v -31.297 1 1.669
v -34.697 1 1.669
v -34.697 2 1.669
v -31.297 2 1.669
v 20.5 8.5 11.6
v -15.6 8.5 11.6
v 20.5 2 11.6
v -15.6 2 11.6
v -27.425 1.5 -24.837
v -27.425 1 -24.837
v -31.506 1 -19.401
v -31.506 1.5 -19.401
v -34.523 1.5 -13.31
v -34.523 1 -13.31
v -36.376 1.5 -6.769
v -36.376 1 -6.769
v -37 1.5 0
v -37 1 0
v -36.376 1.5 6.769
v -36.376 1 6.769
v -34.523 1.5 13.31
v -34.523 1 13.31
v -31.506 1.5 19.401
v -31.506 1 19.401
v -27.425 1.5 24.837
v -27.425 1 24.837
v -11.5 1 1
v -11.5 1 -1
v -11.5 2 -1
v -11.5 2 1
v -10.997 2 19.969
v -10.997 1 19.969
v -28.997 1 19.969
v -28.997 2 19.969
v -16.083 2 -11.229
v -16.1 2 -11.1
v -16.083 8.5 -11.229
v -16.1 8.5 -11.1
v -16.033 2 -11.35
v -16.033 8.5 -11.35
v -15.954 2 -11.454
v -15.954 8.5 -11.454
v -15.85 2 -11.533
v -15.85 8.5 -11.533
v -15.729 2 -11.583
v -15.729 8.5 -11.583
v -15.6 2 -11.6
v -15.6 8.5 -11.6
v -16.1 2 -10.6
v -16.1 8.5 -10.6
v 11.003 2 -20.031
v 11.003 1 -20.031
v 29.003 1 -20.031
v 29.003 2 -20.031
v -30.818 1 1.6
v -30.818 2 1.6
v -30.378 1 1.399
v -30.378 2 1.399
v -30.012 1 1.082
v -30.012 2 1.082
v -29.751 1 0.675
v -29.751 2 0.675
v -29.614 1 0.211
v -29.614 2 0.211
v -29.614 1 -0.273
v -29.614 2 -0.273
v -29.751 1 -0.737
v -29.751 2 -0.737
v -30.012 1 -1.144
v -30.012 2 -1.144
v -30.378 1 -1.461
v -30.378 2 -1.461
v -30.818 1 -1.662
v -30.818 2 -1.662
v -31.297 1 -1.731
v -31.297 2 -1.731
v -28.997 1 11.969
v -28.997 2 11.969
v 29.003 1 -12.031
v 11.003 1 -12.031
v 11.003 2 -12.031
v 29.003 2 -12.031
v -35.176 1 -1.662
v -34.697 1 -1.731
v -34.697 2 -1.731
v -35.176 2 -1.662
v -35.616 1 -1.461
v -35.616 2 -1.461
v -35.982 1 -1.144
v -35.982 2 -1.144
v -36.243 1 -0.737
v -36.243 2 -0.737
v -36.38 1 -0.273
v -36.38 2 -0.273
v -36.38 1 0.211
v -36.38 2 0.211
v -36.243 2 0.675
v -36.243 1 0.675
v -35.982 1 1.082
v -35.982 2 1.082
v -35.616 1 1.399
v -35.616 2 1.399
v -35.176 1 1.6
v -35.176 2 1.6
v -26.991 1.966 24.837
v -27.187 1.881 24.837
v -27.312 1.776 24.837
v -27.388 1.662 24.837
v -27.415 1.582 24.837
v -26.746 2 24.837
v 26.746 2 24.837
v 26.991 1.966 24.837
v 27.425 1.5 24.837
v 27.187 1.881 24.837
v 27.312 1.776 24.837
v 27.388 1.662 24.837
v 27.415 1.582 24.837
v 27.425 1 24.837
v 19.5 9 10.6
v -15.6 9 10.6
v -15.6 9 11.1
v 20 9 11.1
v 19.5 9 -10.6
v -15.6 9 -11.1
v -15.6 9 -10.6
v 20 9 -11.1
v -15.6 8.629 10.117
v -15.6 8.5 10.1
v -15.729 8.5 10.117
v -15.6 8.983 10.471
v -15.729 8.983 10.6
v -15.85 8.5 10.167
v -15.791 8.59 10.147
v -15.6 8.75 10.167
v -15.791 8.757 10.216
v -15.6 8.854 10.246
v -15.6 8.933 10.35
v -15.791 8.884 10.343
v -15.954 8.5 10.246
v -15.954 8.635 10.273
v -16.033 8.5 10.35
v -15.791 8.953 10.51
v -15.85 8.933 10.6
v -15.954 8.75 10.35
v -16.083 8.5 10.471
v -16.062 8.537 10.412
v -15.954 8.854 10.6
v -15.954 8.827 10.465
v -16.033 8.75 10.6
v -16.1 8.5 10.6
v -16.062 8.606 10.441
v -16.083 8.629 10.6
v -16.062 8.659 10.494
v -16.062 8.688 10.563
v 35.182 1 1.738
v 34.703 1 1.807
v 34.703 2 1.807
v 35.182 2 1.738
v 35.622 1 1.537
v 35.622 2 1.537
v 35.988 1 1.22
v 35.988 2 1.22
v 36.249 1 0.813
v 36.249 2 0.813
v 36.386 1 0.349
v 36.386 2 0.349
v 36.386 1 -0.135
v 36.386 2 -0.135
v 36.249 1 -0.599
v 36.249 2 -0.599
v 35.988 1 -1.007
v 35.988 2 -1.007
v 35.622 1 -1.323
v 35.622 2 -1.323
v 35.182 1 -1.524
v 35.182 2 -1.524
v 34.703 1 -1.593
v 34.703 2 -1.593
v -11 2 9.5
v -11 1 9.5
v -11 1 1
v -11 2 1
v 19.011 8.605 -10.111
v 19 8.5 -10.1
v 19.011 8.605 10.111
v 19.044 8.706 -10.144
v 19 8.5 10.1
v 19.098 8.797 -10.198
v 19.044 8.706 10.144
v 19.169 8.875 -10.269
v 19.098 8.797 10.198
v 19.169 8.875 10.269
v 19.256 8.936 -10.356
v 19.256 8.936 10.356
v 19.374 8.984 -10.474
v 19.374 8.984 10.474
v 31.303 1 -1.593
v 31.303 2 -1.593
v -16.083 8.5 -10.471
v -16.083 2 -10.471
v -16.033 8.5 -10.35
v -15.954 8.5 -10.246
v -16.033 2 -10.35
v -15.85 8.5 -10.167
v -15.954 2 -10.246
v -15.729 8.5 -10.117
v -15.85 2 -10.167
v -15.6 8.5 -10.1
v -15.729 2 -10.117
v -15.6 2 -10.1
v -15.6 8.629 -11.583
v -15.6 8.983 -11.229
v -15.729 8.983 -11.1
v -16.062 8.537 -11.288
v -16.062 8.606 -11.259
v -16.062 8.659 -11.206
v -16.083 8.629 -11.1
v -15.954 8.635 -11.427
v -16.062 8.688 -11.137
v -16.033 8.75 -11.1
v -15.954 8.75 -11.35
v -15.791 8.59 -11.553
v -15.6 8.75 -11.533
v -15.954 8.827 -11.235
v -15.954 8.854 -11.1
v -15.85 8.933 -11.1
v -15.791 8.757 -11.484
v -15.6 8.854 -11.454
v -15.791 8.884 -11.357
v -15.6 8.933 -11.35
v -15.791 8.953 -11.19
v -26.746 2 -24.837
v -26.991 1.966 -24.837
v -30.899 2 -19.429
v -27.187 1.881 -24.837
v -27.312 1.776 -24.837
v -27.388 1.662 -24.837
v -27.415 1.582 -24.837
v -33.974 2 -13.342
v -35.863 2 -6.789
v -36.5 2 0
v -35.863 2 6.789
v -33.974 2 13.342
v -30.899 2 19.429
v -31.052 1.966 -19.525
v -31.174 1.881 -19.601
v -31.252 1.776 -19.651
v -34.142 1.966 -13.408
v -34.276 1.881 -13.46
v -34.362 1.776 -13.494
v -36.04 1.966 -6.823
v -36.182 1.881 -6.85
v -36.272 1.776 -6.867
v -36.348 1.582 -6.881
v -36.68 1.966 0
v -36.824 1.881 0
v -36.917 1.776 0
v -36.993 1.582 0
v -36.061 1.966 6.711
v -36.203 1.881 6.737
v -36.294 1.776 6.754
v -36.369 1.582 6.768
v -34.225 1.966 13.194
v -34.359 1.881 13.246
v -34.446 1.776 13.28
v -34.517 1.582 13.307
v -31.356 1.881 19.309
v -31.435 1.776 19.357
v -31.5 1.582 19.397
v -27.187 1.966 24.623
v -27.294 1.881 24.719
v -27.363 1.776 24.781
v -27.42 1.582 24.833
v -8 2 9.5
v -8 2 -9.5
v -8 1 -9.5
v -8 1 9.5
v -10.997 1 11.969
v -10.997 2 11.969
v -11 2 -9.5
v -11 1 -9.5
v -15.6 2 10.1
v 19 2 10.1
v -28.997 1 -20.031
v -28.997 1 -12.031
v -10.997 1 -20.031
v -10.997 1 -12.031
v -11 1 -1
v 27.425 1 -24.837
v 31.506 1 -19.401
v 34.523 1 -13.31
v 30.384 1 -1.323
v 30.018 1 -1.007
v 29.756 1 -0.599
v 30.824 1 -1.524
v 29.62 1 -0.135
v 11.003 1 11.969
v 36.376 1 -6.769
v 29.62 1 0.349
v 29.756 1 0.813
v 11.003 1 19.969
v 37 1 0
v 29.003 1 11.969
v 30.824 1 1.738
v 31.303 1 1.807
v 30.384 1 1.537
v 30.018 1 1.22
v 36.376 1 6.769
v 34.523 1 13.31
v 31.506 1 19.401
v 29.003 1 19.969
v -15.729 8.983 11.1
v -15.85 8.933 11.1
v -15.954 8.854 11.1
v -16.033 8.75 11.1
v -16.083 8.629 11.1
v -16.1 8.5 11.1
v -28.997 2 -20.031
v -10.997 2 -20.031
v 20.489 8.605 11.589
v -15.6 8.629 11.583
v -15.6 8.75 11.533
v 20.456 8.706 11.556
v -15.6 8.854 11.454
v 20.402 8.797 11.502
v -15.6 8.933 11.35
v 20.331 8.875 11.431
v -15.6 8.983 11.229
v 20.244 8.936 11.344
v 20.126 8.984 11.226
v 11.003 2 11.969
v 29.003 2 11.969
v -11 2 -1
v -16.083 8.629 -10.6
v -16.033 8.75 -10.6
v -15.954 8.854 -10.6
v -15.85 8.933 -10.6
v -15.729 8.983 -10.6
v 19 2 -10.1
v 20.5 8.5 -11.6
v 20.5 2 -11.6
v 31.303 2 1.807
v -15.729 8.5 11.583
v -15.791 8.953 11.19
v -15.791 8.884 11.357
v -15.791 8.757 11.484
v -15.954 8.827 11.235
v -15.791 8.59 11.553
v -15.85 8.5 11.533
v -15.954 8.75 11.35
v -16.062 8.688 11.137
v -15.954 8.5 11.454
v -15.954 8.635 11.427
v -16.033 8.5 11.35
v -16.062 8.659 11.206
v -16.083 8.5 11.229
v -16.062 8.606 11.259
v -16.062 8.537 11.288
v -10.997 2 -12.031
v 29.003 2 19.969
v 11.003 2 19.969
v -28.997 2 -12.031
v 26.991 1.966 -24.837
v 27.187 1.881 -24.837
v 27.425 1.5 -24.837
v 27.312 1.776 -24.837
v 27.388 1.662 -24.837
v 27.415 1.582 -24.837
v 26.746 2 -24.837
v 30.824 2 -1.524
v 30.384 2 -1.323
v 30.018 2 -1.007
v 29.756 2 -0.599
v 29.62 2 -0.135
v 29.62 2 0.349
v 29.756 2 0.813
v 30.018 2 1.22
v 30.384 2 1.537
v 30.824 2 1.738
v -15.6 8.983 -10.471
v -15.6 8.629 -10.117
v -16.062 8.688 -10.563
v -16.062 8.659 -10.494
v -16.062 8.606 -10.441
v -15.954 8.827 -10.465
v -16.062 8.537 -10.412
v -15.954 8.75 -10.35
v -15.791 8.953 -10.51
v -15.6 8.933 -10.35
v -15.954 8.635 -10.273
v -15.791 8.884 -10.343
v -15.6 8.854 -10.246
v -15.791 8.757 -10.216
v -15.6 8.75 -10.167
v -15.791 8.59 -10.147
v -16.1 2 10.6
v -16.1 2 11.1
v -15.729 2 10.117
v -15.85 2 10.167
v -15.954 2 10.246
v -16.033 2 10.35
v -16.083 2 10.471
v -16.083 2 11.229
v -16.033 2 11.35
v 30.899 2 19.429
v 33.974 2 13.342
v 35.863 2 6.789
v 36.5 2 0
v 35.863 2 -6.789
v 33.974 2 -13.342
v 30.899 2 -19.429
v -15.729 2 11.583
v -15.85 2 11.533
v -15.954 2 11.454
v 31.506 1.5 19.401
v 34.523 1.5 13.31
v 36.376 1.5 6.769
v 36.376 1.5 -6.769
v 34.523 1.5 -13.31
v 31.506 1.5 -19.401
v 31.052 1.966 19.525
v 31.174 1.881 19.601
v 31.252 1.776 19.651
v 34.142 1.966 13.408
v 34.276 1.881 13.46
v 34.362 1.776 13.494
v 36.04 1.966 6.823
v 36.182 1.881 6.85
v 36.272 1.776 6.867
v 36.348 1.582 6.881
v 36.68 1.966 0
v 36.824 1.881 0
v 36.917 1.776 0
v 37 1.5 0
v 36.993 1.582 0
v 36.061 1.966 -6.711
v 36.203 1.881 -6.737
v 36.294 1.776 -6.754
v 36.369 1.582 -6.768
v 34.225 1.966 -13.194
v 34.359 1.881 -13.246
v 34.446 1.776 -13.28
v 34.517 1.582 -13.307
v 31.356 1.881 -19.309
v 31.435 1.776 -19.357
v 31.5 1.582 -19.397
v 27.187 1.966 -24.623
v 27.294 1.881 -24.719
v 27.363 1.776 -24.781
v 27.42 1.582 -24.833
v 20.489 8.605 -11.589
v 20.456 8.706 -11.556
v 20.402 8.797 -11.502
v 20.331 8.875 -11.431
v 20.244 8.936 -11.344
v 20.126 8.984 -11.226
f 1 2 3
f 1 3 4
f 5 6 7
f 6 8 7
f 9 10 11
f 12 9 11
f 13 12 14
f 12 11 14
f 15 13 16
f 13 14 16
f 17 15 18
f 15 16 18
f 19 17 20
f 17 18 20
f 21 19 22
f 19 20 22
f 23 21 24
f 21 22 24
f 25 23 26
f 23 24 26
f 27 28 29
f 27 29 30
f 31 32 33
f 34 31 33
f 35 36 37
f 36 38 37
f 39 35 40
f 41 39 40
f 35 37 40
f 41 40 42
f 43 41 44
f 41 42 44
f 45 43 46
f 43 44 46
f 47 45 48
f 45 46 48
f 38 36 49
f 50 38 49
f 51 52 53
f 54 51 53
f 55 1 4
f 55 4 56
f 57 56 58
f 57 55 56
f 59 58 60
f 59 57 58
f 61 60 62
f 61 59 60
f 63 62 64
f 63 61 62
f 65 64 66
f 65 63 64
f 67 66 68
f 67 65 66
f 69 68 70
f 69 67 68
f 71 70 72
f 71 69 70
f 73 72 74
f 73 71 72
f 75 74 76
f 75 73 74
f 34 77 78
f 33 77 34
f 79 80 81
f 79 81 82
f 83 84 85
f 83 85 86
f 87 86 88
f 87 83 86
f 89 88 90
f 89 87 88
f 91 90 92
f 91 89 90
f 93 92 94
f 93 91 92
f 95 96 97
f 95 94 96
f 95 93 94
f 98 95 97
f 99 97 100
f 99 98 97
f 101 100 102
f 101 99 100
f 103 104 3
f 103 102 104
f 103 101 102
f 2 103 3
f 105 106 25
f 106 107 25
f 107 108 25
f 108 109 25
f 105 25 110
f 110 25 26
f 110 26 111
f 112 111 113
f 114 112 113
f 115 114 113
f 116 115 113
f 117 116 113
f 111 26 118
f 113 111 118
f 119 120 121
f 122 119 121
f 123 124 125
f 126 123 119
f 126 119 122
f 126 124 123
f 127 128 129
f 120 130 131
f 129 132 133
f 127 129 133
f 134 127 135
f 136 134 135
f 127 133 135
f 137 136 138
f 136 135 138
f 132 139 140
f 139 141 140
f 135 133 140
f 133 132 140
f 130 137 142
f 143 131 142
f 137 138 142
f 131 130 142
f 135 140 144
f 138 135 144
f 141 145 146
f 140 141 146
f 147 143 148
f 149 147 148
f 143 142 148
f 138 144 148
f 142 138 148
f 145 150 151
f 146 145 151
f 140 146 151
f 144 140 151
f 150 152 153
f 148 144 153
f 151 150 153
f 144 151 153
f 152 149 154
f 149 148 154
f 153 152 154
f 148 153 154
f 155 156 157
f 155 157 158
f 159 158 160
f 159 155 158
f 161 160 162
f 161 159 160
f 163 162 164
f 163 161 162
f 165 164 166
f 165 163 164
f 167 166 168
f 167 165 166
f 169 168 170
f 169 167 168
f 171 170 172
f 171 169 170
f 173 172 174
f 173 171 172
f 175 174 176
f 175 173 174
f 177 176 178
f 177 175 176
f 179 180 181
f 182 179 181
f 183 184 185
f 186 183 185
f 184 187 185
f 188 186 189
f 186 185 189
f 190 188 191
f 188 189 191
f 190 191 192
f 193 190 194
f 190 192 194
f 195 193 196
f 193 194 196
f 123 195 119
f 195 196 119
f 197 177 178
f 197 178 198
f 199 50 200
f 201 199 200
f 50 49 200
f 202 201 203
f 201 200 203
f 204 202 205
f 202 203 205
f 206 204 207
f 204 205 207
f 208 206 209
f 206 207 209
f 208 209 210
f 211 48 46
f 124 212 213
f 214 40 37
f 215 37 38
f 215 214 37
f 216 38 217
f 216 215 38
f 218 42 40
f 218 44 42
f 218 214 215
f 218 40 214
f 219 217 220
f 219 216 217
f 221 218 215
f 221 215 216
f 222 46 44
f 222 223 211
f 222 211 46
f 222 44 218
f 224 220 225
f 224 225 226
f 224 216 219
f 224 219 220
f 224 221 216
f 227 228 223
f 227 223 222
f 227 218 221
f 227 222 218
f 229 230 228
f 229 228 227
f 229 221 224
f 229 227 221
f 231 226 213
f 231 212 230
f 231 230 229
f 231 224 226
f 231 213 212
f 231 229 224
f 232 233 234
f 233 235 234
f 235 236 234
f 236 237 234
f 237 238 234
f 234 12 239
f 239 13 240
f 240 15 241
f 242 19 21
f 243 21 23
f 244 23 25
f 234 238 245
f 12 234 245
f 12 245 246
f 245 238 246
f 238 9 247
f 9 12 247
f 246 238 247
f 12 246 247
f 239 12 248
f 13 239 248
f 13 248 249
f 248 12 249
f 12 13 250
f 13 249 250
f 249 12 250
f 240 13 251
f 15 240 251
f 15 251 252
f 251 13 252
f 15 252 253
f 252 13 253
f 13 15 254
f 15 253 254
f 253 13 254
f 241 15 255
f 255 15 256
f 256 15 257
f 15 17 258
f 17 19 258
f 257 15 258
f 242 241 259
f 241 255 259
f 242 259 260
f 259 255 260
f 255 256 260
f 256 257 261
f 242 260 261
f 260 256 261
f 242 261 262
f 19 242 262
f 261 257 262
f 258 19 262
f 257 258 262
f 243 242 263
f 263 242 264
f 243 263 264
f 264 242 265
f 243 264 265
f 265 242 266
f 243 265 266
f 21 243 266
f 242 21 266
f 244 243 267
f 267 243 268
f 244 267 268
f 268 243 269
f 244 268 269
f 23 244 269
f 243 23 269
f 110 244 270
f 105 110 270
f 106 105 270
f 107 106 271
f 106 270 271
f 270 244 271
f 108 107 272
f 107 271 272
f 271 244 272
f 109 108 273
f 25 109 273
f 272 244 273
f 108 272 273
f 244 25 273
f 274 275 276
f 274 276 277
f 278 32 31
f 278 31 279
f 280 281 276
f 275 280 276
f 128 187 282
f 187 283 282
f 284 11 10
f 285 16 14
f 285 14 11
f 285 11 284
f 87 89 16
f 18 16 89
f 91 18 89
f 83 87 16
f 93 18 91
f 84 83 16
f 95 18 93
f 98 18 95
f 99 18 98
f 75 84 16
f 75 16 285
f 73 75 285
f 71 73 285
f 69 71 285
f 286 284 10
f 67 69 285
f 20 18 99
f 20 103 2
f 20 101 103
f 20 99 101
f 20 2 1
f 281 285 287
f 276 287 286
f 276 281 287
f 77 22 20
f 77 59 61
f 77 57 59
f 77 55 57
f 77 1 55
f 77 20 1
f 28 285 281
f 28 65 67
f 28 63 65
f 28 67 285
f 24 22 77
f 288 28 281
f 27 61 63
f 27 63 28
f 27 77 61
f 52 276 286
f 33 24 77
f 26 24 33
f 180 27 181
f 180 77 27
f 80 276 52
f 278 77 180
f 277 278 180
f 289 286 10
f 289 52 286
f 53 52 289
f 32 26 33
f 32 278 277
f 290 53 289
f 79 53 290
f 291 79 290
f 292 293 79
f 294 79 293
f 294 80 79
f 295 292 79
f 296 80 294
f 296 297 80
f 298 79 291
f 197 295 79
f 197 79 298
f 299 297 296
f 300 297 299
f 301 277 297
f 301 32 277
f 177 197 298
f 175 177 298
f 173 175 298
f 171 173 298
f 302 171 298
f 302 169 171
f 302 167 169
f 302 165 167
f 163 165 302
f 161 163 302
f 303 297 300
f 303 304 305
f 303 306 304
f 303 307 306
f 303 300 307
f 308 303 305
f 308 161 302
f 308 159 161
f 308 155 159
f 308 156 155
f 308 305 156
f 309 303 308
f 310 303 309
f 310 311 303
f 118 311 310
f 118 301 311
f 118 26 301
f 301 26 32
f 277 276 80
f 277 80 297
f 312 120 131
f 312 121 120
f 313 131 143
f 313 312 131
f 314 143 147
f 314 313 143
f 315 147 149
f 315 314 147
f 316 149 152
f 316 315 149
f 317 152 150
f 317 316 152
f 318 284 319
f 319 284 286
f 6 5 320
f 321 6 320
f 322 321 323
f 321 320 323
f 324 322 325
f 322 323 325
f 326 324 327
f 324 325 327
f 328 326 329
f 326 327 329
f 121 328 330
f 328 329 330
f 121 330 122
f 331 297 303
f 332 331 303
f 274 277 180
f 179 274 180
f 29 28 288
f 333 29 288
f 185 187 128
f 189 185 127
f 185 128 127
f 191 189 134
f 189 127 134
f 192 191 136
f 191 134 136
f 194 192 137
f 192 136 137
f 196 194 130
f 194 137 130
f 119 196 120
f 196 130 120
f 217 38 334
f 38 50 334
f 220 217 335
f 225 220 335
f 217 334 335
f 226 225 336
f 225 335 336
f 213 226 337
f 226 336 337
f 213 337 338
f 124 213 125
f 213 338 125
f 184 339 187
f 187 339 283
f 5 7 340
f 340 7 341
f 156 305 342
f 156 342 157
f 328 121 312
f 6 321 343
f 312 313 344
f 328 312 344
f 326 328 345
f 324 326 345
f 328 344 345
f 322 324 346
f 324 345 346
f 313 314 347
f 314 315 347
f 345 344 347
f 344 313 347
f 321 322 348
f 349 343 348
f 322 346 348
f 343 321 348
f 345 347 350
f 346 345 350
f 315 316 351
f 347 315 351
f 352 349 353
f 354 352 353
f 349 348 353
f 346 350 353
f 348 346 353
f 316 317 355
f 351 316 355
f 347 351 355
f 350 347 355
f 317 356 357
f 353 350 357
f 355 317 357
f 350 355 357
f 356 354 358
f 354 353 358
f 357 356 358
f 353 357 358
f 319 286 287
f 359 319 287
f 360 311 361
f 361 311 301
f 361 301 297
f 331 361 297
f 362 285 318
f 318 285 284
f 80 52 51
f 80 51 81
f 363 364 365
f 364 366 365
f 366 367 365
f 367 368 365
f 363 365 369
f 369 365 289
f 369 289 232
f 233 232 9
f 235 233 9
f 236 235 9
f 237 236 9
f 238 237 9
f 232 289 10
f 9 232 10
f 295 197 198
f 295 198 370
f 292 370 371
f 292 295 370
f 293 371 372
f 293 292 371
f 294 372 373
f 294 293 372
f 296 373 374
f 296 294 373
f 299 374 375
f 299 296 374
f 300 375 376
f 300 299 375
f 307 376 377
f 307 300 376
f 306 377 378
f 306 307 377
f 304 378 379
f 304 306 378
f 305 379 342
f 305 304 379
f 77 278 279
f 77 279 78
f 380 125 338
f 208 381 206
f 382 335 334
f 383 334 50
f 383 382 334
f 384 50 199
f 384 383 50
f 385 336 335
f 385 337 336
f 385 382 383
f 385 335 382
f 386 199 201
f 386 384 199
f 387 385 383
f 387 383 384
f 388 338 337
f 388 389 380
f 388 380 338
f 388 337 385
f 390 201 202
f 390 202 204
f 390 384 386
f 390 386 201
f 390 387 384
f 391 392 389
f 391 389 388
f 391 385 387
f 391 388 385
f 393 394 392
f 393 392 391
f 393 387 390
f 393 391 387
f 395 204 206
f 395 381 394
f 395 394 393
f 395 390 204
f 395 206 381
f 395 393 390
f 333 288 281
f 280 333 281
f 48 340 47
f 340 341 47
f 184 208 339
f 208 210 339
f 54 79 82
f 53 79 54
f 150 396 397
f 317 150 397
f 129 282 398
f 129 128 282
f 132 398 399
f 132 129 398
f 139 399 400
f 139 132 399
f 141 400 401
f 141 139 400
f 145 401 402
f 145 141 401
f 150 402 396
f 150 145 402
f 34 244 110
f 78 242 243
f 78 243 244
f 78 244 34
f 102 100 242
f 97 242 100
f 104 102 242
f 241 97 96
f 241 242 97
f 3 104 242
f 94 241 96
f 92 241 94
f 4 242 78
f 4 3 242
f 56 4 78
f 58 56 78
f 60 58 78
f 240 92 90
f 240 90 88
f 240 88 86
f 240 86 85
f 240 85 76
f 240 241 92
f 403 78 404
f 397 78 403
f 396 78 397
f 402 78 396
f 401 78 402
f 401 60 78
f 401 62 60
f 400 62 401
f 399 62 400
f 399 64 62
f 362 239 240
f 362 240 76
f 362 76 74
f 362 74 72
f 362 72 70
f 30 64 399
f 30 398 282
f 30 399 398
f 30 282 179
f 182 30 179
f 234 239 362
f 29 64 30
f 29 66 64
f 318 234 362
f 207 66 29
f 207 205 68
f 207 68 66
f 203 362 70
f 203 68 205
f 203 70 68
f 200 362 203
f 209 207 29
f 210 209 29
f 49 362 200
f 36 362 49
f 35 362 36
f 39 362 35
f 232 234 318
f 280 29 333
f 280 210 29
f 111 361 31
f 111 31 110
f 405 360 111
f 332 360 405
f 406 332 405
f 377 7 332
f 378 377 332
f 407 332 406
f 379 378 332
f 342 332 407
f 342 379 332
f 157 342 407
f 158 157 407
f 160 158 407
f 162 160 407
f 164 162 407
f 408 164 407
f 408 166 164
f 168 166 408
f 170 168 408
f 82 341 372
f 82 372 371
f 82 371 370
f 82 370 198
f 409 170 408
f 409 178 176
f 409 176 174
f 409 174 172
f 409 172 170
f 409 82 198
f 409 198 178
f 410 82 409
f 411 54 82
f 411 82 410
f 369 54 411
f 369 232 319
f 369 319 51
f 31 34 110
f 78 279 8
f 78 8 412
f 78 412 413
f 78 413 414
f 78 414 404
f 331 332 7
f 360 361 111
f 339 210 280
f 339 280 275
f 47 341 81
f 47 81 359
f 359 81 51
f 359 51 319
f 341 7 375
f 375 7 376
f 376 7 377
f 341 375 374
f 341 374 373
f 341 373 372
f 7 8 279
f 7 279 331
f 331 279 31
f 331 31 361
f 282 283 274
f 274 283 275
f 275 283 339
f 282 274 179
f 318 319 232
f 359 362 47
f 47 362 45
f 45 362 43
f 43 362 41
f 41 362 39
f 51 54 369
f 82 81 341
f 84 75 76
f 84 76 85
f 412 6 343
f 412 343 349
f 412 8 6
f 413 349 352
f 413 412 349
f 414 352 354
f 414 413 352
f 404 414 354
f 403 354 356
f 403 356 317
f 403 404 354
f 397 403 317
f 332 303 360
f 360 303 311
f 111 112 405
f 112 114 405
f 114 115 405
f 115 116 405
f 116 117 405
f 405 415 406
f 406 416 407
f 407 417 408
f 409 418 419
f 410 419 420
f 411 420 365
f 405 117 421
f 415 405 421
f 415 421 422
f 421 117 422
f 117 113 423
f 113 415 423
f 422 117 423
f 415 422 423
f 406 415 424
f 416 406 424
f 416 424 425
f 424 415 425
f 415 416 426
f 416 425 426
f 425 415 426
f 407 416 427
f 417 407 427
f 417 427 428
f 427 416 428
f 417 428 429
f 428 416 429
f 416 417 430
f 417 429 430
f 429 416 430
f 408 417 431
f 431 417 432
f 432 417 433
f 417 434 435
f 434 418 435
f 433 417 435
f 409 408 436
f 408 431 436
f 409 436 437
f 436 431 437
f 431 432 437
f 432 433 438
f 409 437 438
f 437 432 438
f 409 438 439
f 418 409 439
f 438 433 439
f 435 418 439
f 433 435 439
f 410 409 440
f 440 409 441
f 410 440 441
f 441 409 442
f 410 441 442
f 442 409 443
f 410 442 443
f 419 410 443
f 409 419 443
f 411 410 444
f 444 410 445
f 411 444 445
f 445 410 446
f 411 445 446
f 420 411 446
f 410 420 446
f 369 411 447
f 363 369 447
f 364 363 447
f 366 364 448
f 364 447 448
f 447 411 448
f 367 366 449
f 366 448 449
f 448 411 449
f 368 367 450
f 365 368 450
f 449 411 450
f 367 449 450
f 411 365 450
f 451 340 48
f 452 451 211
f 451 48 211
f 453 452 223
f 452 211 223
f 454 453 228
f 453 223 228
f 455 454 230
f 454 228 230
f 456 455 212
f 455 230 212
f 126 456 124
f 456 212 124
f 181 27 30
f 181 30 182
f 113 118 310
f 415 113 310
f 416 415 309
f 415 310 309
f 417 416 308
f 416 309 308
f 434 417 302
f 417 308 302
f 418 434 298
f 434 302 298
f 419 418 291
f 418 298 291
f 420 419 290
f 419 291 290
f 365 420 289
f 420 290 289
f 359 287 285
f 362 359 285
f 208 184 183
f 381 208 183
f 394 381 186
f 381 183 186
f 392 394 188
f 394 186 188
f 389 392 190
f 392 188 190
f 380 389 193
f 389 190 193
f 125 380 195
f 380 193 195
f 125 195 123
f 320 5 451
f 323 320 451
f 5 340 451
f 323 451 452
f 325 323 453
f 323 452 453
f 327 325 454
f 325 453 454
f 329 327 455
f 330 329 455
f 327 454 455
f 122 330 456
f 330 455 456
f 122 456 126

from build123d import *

# Parameters (mm, degrees)
BOSS_EXTRUDE1_DEPTH     = 2
SKETCH2_W               = 3.5
SKETCH2_H               = 2
CUT_EXTRUDE1_DEPTH      = 22
BOSS_EXTRUDE2_DEPTH     = 7
BOSS_EXTRUDE3_DEPTH     = 6
SKETCH5_R               = 2.25
CUT_EXTRUDE3_DEPTH      = 37
CUT_EXTRUDE3_DEPTH_BACK = 37
FILLET1_R               = 3
FILLET2_R               = 0.5
CUT_EXTRUDE4_DEPTH      = 37
FILLET3_R               = 0.5
FILLET4_R               = 0.5
CUT_EXTRUDE5_DEPTH      = 10
FILLET8_R               = 1
SKETCH8_W               = 0.1
SKETCH8_H               = 1
CUT_EXTRUDE6_DEPTH      = 0.1
SKETCH10_R              = 57.556720945
CUT_EXTRUDE7_DEPTH      = 11
CUT_EXTRUDE7_DEPTH_BACK = 1


with BuildPart() as part:
    # Sketch1 → Boss-Extrude1 (new body)
    with BuildSketch(Plane(origin=(0, 0, 0), x_dir=(1, 0, 0), z_dir=(0, 1, 0))):
        with BuildLine():
            Line((-27.424590139, -24.837307739), (27.424590139, -24.837307739))
            ThreePointArc((27.424590139, -24.837307739), (37, 0), (27.424590139, 24.837307739))
            Line((27.424590139, 24.837307739), (-27.424590139, 24.837307739))
            ThreePointArc((-27.424590139, 24.837307739), (-37, 0), (-27.424590139, -24.837307739))
        make_face()
    extrude(amount=BOSS_EXTRUDE1_DEPTH)

    # Sketch2 → Cut-Extrude1 (cut)
    with BuildSketch(Plane.XZ):
        Polygon((-8, 0), (-8, 9.5), (-11, 9.5), (-11, -9.5), (-8, -9.5), align=None)
        with Locations((-9.75, 0)):
            Rectangle(SKETCH2_W, SKETCH2_H)
    extrude(amount=-CUT_EXTRUDE1_DEPTH, mode=Mode.SUBTRACT)

    # Sketch3 → Boss-Extrude2 (add)
    with BuildSketch(Plane(origin=(0, 2, 0), x_dir=(1, 0, 0), z_dir=(0, 1, 0))):
        Polygon((2.9, 11.6), (2.9, 10.1), (19, 10.1), (20.5, 10.1), (20.5, 11.6), align=None)
        Polygon((20.5, 10.1), (19, 10.1), (19, -10.1), (19, -11.6), (20.5, -11.6), align=None)
        Polygon((19, -11.6), (19, -10.1), (-14.6, -10.1), (-16.1, -10.1), (-16.1, -11.6), align=None)
        Polygon((-14.6, 10.1), (2.9, 10.1), (2.9, 11.6), (-16.1, 11.6), (-16.1, 10.1), align=None)
    extrude(amount=BOSS_EXTRUDE2_DEPTH)

    # Sketch4 → Boss-Extrude3 (add)
    with BuildSketch(Plane.XZ):
        Polygon((-8, 0), (-8.02303658, 9.318964787), (-3, 9.318964787), (-3, -9.5), (-8, -9.5), align=None)
    extrude(amount=BOSS_EXTRUDE3_DEPTH)

    # Sketch5 → Cut-Extrude3 (cut, two sides)
    with BuildSketch(Plane.ZY.offset(8)) as cut_extrude3_sk:
        with Locations((-5.031035213, -2.35)):
            Circle(SKETCH5_R)
        with Locations((5.031035213, -2.35)):
            Circle(SKETCH5_R)
    extrude(amount=CUT_EXTRUDE3_DEPTH, mode=Mode.SUBTRACT)
    extrude(cut_extrude3_sk.sketch, amount=-CUT_EXTRUDE3_DEPTH_BACK, mode=Mode.SUBTRACT)

    # Fillet1
    fillet1_edges = [part.edges().sort_by_distance(p)[0] for p in [
        (-5.5, -6, -9.5),
        (-5.51151829, -6, 9.318964787),
    ]]
    fillet(fillet1_edges, radius=FILLET1_R)

    # Fillet2
    fillet2_edges = [part.edges().sort_by_distance(p)[0] for p in [
        (-37, 2, 0),
        (37, 2, 0),
    ]]
    fillet(fillet2_edges, radius=FILLET2_R)

    # Sketch6 → Cut-Extrude4 (cut)
    with BuildSketch(Plane.XZ):
        with BuildLine():
            Line((-34.696885188, 1.668964787), (-31.296885188, 1.668964787))
            ThreePointArc((-31.296885188, 1.668964787), (-29.596885188, -0.031035213), (-31.296885188, -1.731035213))
            Line((-31.296885188, -1.731035213), (-34.696885188, -1.731035213))
            ThreePointArc((-34.696885188, -1.731035213), (-36.396885188, -0.031035213), (-34.696885188, 1.668964787))
        make_face()
        with BuildLine():
            Line((31.302827177, 1.806746588), (34.702827177, 1.806746588))
            ThreePointArc((34.702827177, 1.806746588), (36.402827177, 0.106746588), (34.702827177, -1.593253412))
            Line((34.702827177, -1.593253412), (31.302827177, -1.593253412))
            ThreePointArc((31.302827177, -1.593253412), (29.602827177, 0.106746588), (31.302827177, 1.806746588))
        make_face()
    extrude(amount=-CUT_EXTRUDE4_DEPTH, mode=Mode.SUBTRACT)

    # Fillet3
    fillet3_edges = [part.edges().sort_by_distance(p)[0] for p in [
        (20.5, 9, 0),
        (2.2, 9, -11.6),
        (2.2, 9, 11.6),
        (1.45, 9, -10.1),
        (19, 9, 0),
        (1.45, 9, 10.1),
    ]]
    fillet(fillet3_edges, radius=FILLET3_R)

    # Fillet4
    fillet4_edges = [part.edges().sort_by_distance(p)[0] for p in [
        (-16.1, 9, -10.85),
        (-16.1, 9, 10.85),
        (-16.1, 5.25, -10.1),
        (-16.1, 5.25, -11.6),
        (-16.1, 8.853553391, -11.453553391),
        (-16.1, 8.853553391, -10.246446609),
        (-16.1, 5.25, 11.6),
        (-16.1, 5.25, 10.1),
        (-16.1, 8.853553391, 10.246446609),
        (-16.1, 8.853553391, 11.453553391),
    ]]
    fillet(fillet4_edges, radius=FILLET4_R)

    # Sketch7 → Cut-Extrude5 (cut)
    with BuildSketch(Plane.XZ):
        Polygon((-19.996885188, 19.968964787), (-10.996885188, 19.968964787), (-10.996885188, 11.968964787), (-28.996885188, 11.968964787), (-28.996885188, 19.968964787), align=None)
        Polygon((11.003114812, 11.968964787), (20.003114812, 11.968964787), (20.003114812, 14.968964787), (20.003114812, 19.968964787), (11.003114812, 19.968964787), align=None)
        Polygon((20.003114812, 14.968964787), (20.003114812, 11.968964787), (29.003114812, 11.968964787), (29.003114812, 19.968964787), (20.003114812, 19.968964787), align=None)
        Polygon((-28.996885188, -12.031035213), (-28.996885188, -20.031035213), (-19.996885188, -20.031035213), (-10.996885188, -20.031035213), (-10.996885188, -12.031035213), align=None)
        Polygon((20.003114812, -20.031035213), (11.003114812, -20.031035213), (11.003114812, -12.031035213), (29.003114812, -12.031035213), (29.003114812, -20.031035213), align=None)
    extrude(amount=-CUT_EXTRUDE5_DEPTH, mode=Mode.SUBTRACT)

    # Fillet8
    fillet8_edges = [part.edges().sort_by_distance(p)[0] for p in [
        (11.003114812, 0, 15.968964787),
        (20.003114812, 0, 11.968964787),
        (29.003114812, 0, 15.968964787),
        (20.003114812, 0, 19.968964787),
        (-28.996885188, 0, -16.031035213),
        (-19.996885188, 0, -20.031035213),
        (-10.996885188, 0, -16.031035213),
        (-19.996885188, 0, -12.031035213),
        (20.003114812, 0, -20.031035213),
        (11.003114812, 0, -16.031035213),
        (20.003114812, 0, -12.031035213),
        (29.003114812, 0, -16.031035213),
        (-19.996885188, 0, 19.968964787),
        (-10.996885188, 0, 15.968964787),
        (-19.996885188, 0, 11.968964787),
        (-28.996885188, 0, 15.968964787),
    ]]
    fillet(fillet8_edges, radius=FILLET8_R)

    # Sketch8 → Cut-Extrude6 (cut)
    with BuildSketch(Plane.XY.offset(24.837307739)):
        with Locations((-0.05, 0.5)):
            Rectangle(SKETCH8_W, SKETCH8_H)
        with Locations((0.05, 0.5)):
            Rectangle(SKETCH8_W, SKETCH8_H)
    extrude(amount=-CUT_EXTRUDE6_DEPTH, mode=Mode.SUBTRACT)

    # Sketch10 → Cut-Extrude7 (cut, two sides)
    with BuildSketch(Plane.XZ) as cut_extrude7_sk:
        Circle(SKETCH10_R)
    extrude(amount=CUT_EXTRUDE7_DEPTH, mode=Mode.SUBTRACT)
    extrude(cut_extrude7_sk.sketch, amount=-CUT_EXTRUDE7_DEPTH_BACK, mode=Mode.SUBTRACT)


solid = part.part
